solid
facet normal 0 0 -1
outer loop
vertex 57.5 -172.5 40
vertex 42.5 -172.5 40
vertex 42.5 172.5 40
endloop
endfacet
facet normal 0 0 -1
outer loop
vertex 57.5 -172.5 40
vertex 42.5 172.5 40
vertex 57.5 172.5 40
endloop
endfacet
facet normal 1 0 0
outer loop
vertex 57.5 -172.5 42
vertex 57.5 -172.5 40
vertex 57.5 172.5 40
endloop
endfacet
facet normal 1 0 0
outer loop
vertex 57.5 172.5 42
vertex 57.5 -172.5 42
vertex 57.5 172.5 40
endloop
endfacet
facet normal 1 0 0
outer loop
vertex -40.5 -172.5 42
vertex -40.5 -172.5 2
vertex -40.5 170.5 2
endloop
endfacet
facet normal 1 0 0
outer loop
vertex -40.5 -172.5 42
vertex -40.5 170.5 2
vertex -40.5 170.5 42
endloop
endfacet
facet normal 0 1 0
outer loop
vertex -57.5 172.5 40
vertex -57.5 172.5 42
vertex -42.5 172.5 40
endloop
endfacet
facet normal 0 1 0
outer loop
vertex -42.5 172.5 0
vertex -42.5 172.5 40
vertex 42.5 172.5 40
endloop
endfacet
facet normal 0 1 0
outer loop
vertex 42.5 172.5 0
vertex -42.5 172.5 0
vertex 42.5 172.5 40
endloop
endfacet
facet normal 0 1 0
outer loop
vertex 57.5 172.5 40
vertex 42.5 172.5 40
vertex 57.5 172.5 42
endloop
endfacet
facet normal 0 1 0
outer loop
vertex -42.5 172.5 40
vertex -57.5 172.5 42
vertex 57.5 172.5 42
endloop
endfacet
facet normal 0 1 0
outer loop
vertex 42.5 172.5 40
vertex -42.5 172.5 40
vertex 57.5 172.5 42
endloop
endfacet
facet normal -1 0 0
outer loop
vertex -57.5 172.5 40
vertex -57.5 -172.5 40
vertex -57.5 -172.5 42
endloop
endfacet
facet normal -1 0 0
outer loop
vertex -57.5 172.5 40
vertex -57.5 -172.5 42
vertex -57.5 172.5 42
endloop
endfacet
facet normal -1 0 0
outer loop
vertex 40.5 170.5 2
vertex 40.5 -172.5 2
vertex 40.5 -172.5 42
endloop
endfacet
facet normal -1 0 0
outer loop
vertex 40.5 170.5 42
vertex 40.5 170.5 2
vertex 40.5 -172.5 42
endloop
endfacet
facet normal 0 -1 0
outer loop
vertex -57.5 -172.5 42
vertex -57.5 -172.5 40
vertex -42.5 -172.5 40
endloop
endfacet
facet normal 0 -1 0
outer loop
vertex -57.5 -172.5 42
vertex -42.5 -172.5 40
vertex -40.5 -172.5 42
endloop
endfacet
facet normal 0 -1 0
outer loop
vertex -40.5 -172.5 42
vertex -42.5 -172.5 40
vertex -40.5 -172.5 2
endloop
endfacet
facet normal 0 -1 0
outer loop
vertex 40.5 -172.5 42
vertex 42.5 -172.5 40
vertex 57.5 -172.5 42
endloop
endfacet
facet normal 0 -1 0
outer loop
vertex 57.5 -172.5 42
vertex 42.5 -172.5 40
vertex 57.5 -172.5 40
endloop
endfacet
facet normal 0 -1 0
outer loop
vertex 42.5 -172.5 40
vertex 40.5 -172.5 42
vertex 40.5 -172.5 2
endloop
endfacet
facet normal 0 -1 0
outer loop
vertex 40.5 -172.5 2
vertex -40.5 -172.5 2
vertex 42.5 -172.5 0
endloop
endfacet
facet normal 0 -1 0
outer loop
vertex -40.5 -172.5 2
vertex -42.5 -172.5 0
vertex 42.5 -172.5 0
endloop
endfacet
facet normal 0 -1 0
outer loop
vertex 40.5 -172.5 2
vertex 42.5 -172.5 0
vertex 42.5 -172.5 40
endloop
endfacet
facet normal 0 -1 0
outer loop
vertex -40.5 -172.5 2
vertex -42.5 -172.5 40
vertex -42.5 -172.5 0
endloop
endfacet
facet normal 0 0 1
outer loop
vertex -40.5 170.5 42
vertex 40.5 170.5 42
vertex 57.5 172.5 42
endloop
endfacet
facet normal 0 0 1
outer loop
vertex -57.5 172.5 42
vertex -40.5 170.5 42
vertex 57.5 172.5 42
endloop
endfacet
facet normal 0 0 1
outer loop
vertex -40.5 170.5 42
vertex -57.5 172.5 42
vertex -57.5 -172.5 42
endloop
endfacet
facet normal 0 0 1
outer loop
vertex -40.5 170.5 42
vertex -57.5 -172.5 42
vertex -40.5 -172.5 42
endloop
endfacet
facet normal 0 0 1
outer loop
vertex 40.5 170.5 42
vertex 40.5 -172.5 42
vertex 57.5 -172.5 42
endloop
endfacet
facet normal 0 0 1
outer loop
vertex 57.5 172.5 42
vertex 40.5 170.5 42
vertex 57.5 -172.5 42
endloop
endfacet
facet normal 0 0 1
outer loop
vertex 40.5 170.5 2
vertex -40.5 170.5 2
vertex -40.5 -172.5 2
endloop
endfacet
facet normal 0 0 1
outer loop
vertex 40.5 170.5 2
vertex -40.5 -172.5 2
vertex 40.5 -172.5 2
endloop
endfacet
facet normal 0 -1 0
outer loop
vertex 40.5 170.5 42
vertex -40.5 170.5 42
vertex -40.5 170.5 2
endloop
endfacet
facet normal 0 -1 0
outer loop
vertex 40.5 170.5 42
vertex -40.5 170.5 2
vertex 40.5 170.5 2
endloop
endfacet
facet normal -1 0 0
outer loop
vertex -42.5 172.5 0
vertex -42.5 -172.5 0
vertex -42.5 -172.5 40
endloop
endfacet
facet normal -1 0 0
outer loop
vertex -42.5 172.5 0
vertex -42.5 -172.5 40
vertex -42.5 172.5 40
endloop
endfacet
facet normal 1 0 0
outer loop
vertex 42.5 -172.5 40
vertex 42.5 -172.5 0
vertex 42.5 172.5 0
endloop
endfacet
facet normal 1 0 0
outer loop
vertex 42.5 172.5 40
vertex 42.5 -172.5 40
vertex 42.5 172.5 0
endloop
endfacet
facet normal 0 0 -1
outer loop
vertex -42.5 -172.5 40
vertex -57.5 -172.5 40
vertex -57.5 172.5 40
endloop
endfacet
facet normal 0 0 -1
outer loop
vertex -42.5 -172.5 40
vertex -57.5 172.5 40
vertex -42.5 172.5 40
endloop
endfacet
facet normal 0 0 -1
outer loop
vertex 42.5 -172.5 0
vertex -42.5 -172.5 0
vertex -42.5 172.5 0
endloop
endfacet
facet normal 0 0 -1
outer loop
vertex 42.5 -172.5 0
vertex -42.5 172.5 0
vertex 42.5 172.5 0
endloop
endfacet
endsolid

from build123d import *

# Parameters (mm, degrees)
F0_W          = 85
F0_H          = 345
F1_DEPTH      = 42
F2_T          = -2
F3_W          = 81
F3_H          = 40
F4_DEPTH      = 172.5
F4_DEPTH_BACK = 172.5
F6_START      = 40
F5_W          = 15
F5_H          = 345
F6_DEPTH      = 2
F8_START      = -170.5
F7_W          = 81
F7_H          = 40
F8_DEPTH      = 2


with BuildPart() as f1:
    # F0 (on Top) → F1 (new body)
    with BuildSketch(Plane.XY):
        Rectangle(F0_W, F0_H)
    extrude(amount=F1_DEPTH)

    # F2
    f2_openings = [f1.faces().sort_by_distance(p)[0] for p in [
        (0, 0, 42),
    ]]
    offset(amount=F2_T, openings=f2_openings)

    # F3 (on Front) → F4 (cut, two sides)
    with BuildSketch(Plane.XZ) as f4_sk:
        with Locations((0, 22)):
            Rectangle(F3_W, F3_H)
    extrude(amount=F4_DEPTH, mode=Mode.SUBTRACT)
    extrude(f4_sk.sketch, amount=-F4_DEPTH_BACK, mode=Mode.SUBTRACT)

    # F5 (on Top) → F6 (join)
    with BuildSketch(Plane.XY.offset(F6_START)):
        with Locations((-50, 0)):
            Rectangle(F5_W, F5_H)
        with Locations((50, 0)):
            Rectangle(F5_W, F5_H)
    extrude(amount=F6_DEPTH)

    # F7 (on Front) → F8 (join)
    with BuildSketch(Plane.XZ.offset(F8_START)):
        with Locations((0, 22)):
            Rectangle(F7_W, F7_H)
    extrude(amount=-F8_DEPTH)


solid = f1.part
